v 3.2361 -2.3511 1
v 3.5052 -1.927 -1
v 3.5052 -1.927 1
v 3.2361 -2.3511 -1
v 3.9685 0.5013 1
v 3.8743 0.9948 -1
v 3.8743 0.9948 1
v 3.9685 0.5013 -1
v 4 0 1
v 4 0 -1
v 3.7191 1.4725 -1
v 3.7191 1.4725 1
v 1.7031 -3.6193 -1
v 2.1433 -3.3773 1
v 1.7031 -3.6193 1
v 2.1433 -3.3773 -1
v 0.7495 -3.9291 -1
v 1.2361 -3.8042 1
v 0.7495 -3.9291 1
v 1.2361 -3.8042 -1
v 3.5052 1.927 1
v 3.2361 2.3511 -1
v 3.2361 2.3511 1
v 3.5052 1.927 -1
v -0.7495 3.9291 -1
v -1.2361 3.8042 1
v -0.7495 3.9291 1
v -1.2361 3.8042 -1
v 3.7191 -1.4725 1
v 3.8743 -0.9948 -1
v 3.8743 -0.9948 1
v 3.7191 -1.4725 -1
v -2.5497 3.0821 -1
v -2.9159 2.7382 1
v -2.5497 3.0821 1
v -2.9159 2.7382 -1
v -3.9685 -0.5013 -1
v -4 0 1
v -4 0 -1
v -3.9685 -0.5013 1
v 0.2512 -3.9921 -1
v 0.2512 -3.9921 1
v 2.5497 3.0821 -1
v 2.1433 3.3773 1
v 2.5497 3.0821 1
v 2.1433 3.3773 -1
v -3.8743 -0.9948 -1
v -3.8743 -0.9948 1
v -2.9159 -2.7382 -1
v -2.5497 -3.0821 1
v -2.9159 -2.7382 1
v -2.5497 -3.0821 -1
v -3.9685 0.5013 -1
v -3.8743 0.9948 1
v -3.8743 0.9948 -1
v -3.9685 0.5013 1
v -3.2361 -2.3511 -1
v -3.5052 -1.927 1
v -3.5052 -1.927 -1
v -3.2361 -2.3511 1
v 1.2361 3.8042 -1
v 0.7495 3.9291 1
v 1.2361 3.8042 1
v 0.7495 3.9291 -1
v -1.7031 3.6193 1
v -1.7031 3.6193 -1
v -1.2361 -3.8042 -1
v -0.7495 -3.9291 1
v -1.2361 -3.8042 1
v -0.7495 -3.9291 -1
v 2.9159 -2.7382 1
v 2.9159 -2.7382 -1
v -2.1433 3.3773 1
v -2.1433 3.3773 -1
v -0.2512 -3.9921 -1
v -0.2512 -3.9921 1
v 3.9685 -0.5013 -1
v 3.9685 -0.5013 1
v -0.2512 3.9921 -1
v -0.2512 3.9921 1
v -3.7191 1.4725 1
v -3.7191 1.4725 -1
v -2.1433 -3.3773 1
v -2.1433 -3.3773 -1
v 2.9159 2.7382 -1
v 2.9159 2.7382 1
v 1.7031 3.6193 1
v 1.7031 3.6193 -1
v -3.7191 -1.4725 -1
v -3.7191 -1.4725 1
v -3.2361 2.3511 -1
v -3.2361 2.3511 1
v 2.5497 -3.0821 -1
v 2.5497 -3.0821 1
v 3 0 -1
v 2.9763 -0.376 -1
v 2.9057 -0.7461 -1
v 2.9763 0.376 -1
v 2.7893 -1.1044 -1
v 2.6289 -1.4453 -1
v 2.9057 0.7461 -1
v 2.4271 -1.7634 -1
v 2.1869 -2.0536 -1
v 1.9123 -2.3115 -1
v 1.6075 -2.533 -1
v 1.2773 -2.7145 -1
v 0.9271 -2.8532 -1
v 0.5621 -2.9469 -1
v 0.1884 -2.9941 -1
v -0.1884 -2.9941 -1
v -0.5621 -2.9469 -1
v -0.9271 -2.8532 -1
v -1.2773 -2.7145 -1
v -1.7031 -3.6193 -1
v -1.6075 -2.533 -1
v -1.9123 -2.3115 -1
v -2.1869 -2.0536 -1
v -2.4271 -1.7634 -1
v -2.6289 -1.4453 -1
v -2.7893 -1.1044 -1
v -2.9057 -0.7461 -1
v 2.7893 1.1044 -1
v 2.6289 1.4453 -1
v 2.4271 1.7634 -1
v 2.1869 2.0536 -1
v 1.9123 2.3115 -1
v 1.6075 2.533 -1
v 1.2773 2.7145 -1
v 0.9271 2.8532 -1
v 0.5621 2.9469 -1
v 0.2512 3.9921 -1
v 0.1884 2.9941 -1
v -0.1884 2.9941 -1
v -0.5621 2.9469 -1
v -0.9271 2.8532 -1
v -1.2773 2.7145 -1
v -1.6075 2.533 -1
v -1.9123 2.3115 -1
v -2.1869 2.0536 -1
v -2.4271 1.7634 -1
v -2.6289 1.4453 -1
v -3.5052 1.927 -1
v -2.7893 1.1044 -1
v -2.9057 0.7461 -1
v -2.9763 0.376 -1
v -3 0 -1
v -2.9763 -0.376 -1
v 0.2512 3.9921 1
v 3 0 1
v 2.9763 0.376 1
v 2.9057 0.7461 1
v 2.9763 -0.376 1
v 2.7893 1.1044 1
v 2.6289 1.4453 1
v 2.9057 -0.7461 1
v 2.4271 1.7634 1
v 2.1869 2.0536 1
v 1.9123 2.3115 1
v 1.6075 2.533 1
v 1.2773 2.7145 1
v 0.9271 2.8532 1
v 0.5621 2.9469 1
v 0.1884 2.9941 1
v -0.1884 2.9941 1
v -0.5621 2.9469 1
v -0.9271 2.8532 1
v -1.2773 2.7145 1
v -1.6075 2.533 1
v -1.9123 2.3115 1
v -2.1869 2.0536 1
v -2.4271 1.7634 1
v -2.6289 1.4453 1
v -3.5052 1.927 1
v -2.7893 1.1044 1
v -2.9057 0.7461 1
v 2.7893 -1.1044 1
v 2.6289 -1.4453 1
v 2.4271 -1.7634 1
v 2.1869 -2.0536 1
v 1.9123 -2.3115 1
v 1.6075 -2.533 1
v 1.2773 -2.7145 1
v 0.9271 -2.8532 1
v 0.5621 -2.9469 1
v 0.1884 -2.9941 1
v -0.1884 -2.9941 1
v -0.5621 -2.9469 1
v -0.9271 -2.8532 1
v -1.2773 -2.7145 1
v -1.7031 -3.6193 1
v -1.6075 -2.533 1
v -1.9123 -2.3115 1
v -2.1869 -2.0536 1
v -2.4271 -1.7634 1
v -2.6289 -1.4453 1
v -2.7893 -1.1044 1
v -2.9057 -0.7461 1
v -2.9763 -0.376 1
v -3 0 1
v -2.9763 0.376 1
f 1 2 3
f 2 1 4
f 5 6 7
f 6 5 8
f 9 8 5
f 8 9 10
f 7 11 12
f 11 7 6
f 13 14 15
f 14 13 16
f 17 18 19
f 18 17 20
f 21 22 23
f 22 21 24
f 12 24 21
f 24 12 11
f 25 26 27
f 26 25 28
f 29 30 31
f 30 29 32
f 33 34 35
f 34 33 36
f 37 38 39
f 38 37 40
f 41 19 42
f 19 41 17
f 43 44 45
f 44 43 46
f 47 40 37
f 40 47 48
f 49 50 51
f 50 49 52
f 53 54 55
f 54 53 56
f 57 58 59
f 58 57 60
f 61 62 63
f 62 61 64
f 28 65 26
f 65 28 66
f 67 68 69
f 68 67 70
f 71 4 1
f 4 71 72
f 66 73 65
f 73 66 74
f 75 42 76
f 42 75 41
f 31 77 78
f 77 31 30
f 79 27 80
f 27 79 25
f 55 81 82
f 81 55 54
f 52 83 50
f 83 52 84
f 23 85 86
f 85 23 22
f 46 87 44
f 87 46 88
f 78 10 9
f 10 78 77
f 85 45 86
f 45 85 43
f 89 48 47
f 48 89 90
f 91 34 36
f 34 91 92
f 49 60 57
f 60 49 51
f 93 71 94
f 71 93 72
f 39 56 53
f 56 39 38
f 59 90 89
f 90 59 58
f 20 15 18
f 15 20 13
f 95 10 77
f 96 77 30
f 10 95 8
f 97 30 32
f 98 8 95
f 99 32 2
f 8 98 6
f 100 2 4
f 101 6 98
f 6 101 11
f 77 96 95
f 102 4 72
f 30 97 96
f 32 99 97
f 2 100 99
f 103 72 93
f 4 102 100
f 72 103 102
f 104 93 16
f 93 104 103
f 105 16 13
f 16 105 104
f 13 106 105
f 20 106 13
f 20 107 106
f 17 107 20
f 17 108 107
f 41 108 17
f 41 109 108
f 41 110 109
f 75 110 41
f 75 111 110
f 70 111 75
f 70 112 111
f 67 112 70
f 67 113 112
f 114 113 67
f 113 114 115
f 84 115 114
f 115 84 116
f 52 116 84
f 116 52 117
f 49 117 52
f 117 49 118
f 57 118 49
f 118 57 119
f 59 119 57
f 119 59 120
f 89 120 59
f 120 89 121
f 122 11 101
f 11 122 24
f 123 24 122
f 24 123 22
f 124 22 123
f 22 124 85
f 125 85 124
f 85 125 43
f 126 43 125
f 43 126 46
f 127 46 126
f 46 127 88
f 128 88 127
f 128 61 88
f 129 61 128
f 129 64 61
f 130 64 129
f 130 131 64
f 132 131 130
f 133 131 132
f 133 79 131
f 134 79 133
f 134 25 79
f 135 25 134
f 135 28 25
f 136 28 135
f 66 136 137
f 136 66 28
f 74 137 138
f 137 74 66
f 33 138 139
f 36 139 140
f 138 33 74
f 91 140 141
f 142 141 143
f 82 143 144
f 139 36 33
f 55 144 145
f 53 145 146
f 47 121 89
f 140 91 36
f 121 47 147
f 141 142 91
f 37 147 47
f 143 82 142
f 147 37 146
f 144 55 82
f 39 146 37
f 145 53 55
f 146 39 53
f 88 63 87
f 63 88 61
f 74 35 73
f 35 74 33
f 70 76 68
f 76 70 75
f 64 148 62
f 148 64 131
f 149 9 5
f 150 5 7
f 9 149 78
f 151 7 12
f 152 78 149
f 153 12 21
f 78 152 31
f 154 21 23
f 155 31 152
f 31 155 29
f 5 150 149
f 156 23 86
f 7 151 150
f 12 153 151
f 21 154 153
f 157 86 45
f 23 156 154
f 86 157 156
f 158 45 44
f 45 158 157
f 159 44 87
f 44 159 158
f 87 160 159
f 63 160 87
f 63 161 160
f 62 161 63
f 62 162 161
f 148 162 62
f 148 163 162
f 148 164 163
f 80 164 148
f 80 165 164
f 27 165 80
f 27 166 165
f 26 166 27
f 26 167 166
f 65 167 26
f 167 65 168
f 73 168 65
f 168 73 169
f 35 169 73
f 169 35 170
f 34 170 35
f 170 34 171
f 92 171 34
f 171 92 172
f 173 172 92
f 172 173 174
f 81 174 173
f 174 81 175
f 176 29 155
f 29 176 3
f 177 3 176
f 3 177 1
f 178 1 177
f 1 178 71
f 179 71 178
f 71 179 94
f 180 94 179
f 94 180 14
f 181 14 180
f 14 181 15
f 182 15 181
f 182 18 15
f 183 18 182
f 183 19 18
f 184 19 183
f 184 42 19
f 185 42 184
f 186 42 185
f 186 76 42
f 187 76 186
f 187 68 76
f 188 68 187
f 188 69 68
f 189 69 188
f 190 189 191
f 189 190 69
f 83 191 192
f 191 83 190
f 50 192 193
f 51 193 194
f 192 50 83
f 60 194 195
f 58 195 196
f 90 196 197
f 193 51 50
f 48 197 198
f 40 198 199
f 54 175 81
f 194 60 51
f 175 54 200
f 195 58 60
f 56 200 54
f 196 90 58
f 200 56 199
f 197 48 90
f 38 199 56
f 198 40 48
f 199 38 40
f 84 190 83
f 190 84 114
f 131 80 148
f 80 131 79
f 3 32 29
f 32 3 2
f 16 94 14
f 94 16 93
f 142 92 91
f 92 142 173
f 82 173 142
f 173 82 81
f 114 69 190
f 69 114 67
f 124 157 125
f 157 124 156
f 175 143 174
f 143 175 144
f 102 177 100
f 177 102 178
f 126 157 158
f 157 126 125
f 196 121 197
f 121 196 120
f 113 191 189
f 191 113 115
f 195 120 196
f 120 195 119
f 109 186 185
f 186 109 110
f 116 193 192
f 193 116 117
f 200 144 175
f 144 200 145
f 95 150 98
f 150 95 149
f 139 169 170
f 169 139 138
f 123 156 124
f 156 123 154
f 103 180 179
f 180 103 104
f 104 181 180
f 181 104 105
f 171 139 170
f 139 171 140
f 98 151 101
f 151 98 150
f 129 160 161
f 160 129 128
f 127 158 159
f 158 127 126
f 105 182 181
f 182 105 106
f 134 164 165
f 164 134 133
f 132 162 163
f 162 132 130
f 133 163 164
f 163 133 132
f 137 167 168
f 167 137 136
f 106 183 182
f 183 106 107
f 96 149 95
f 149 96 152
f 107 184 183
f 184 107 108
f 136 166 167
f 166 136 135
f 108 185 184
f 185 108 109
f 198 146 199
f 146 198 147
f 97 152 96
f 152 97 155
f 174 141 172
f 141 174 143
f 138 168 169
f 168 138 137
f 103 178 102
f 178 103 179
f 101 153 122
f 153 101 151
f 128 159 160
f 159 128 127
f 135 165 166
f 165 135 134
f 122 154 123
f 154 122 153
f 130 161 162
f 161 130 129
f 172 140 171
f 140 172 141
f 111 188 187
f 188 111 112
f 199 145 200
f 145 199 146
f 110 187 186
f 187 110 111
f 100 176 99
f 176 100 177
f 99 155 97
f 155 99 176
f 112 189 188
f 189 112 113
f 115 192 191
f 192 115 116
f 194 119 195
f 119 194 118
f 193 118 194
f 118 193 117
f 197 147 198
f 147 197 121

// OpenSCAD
$fn = 50;


difference() {
	union() {
		translate(v = [0, 0, -1.0000000000]) {
			cylinder(h = 2, r = 4.0000000000);
		}
	}
	union() {
		translate(v = [0, 0, -100.0000000000]) {
			cylinder(h = 200, r = 3.0000000000);
		}
	}
}
